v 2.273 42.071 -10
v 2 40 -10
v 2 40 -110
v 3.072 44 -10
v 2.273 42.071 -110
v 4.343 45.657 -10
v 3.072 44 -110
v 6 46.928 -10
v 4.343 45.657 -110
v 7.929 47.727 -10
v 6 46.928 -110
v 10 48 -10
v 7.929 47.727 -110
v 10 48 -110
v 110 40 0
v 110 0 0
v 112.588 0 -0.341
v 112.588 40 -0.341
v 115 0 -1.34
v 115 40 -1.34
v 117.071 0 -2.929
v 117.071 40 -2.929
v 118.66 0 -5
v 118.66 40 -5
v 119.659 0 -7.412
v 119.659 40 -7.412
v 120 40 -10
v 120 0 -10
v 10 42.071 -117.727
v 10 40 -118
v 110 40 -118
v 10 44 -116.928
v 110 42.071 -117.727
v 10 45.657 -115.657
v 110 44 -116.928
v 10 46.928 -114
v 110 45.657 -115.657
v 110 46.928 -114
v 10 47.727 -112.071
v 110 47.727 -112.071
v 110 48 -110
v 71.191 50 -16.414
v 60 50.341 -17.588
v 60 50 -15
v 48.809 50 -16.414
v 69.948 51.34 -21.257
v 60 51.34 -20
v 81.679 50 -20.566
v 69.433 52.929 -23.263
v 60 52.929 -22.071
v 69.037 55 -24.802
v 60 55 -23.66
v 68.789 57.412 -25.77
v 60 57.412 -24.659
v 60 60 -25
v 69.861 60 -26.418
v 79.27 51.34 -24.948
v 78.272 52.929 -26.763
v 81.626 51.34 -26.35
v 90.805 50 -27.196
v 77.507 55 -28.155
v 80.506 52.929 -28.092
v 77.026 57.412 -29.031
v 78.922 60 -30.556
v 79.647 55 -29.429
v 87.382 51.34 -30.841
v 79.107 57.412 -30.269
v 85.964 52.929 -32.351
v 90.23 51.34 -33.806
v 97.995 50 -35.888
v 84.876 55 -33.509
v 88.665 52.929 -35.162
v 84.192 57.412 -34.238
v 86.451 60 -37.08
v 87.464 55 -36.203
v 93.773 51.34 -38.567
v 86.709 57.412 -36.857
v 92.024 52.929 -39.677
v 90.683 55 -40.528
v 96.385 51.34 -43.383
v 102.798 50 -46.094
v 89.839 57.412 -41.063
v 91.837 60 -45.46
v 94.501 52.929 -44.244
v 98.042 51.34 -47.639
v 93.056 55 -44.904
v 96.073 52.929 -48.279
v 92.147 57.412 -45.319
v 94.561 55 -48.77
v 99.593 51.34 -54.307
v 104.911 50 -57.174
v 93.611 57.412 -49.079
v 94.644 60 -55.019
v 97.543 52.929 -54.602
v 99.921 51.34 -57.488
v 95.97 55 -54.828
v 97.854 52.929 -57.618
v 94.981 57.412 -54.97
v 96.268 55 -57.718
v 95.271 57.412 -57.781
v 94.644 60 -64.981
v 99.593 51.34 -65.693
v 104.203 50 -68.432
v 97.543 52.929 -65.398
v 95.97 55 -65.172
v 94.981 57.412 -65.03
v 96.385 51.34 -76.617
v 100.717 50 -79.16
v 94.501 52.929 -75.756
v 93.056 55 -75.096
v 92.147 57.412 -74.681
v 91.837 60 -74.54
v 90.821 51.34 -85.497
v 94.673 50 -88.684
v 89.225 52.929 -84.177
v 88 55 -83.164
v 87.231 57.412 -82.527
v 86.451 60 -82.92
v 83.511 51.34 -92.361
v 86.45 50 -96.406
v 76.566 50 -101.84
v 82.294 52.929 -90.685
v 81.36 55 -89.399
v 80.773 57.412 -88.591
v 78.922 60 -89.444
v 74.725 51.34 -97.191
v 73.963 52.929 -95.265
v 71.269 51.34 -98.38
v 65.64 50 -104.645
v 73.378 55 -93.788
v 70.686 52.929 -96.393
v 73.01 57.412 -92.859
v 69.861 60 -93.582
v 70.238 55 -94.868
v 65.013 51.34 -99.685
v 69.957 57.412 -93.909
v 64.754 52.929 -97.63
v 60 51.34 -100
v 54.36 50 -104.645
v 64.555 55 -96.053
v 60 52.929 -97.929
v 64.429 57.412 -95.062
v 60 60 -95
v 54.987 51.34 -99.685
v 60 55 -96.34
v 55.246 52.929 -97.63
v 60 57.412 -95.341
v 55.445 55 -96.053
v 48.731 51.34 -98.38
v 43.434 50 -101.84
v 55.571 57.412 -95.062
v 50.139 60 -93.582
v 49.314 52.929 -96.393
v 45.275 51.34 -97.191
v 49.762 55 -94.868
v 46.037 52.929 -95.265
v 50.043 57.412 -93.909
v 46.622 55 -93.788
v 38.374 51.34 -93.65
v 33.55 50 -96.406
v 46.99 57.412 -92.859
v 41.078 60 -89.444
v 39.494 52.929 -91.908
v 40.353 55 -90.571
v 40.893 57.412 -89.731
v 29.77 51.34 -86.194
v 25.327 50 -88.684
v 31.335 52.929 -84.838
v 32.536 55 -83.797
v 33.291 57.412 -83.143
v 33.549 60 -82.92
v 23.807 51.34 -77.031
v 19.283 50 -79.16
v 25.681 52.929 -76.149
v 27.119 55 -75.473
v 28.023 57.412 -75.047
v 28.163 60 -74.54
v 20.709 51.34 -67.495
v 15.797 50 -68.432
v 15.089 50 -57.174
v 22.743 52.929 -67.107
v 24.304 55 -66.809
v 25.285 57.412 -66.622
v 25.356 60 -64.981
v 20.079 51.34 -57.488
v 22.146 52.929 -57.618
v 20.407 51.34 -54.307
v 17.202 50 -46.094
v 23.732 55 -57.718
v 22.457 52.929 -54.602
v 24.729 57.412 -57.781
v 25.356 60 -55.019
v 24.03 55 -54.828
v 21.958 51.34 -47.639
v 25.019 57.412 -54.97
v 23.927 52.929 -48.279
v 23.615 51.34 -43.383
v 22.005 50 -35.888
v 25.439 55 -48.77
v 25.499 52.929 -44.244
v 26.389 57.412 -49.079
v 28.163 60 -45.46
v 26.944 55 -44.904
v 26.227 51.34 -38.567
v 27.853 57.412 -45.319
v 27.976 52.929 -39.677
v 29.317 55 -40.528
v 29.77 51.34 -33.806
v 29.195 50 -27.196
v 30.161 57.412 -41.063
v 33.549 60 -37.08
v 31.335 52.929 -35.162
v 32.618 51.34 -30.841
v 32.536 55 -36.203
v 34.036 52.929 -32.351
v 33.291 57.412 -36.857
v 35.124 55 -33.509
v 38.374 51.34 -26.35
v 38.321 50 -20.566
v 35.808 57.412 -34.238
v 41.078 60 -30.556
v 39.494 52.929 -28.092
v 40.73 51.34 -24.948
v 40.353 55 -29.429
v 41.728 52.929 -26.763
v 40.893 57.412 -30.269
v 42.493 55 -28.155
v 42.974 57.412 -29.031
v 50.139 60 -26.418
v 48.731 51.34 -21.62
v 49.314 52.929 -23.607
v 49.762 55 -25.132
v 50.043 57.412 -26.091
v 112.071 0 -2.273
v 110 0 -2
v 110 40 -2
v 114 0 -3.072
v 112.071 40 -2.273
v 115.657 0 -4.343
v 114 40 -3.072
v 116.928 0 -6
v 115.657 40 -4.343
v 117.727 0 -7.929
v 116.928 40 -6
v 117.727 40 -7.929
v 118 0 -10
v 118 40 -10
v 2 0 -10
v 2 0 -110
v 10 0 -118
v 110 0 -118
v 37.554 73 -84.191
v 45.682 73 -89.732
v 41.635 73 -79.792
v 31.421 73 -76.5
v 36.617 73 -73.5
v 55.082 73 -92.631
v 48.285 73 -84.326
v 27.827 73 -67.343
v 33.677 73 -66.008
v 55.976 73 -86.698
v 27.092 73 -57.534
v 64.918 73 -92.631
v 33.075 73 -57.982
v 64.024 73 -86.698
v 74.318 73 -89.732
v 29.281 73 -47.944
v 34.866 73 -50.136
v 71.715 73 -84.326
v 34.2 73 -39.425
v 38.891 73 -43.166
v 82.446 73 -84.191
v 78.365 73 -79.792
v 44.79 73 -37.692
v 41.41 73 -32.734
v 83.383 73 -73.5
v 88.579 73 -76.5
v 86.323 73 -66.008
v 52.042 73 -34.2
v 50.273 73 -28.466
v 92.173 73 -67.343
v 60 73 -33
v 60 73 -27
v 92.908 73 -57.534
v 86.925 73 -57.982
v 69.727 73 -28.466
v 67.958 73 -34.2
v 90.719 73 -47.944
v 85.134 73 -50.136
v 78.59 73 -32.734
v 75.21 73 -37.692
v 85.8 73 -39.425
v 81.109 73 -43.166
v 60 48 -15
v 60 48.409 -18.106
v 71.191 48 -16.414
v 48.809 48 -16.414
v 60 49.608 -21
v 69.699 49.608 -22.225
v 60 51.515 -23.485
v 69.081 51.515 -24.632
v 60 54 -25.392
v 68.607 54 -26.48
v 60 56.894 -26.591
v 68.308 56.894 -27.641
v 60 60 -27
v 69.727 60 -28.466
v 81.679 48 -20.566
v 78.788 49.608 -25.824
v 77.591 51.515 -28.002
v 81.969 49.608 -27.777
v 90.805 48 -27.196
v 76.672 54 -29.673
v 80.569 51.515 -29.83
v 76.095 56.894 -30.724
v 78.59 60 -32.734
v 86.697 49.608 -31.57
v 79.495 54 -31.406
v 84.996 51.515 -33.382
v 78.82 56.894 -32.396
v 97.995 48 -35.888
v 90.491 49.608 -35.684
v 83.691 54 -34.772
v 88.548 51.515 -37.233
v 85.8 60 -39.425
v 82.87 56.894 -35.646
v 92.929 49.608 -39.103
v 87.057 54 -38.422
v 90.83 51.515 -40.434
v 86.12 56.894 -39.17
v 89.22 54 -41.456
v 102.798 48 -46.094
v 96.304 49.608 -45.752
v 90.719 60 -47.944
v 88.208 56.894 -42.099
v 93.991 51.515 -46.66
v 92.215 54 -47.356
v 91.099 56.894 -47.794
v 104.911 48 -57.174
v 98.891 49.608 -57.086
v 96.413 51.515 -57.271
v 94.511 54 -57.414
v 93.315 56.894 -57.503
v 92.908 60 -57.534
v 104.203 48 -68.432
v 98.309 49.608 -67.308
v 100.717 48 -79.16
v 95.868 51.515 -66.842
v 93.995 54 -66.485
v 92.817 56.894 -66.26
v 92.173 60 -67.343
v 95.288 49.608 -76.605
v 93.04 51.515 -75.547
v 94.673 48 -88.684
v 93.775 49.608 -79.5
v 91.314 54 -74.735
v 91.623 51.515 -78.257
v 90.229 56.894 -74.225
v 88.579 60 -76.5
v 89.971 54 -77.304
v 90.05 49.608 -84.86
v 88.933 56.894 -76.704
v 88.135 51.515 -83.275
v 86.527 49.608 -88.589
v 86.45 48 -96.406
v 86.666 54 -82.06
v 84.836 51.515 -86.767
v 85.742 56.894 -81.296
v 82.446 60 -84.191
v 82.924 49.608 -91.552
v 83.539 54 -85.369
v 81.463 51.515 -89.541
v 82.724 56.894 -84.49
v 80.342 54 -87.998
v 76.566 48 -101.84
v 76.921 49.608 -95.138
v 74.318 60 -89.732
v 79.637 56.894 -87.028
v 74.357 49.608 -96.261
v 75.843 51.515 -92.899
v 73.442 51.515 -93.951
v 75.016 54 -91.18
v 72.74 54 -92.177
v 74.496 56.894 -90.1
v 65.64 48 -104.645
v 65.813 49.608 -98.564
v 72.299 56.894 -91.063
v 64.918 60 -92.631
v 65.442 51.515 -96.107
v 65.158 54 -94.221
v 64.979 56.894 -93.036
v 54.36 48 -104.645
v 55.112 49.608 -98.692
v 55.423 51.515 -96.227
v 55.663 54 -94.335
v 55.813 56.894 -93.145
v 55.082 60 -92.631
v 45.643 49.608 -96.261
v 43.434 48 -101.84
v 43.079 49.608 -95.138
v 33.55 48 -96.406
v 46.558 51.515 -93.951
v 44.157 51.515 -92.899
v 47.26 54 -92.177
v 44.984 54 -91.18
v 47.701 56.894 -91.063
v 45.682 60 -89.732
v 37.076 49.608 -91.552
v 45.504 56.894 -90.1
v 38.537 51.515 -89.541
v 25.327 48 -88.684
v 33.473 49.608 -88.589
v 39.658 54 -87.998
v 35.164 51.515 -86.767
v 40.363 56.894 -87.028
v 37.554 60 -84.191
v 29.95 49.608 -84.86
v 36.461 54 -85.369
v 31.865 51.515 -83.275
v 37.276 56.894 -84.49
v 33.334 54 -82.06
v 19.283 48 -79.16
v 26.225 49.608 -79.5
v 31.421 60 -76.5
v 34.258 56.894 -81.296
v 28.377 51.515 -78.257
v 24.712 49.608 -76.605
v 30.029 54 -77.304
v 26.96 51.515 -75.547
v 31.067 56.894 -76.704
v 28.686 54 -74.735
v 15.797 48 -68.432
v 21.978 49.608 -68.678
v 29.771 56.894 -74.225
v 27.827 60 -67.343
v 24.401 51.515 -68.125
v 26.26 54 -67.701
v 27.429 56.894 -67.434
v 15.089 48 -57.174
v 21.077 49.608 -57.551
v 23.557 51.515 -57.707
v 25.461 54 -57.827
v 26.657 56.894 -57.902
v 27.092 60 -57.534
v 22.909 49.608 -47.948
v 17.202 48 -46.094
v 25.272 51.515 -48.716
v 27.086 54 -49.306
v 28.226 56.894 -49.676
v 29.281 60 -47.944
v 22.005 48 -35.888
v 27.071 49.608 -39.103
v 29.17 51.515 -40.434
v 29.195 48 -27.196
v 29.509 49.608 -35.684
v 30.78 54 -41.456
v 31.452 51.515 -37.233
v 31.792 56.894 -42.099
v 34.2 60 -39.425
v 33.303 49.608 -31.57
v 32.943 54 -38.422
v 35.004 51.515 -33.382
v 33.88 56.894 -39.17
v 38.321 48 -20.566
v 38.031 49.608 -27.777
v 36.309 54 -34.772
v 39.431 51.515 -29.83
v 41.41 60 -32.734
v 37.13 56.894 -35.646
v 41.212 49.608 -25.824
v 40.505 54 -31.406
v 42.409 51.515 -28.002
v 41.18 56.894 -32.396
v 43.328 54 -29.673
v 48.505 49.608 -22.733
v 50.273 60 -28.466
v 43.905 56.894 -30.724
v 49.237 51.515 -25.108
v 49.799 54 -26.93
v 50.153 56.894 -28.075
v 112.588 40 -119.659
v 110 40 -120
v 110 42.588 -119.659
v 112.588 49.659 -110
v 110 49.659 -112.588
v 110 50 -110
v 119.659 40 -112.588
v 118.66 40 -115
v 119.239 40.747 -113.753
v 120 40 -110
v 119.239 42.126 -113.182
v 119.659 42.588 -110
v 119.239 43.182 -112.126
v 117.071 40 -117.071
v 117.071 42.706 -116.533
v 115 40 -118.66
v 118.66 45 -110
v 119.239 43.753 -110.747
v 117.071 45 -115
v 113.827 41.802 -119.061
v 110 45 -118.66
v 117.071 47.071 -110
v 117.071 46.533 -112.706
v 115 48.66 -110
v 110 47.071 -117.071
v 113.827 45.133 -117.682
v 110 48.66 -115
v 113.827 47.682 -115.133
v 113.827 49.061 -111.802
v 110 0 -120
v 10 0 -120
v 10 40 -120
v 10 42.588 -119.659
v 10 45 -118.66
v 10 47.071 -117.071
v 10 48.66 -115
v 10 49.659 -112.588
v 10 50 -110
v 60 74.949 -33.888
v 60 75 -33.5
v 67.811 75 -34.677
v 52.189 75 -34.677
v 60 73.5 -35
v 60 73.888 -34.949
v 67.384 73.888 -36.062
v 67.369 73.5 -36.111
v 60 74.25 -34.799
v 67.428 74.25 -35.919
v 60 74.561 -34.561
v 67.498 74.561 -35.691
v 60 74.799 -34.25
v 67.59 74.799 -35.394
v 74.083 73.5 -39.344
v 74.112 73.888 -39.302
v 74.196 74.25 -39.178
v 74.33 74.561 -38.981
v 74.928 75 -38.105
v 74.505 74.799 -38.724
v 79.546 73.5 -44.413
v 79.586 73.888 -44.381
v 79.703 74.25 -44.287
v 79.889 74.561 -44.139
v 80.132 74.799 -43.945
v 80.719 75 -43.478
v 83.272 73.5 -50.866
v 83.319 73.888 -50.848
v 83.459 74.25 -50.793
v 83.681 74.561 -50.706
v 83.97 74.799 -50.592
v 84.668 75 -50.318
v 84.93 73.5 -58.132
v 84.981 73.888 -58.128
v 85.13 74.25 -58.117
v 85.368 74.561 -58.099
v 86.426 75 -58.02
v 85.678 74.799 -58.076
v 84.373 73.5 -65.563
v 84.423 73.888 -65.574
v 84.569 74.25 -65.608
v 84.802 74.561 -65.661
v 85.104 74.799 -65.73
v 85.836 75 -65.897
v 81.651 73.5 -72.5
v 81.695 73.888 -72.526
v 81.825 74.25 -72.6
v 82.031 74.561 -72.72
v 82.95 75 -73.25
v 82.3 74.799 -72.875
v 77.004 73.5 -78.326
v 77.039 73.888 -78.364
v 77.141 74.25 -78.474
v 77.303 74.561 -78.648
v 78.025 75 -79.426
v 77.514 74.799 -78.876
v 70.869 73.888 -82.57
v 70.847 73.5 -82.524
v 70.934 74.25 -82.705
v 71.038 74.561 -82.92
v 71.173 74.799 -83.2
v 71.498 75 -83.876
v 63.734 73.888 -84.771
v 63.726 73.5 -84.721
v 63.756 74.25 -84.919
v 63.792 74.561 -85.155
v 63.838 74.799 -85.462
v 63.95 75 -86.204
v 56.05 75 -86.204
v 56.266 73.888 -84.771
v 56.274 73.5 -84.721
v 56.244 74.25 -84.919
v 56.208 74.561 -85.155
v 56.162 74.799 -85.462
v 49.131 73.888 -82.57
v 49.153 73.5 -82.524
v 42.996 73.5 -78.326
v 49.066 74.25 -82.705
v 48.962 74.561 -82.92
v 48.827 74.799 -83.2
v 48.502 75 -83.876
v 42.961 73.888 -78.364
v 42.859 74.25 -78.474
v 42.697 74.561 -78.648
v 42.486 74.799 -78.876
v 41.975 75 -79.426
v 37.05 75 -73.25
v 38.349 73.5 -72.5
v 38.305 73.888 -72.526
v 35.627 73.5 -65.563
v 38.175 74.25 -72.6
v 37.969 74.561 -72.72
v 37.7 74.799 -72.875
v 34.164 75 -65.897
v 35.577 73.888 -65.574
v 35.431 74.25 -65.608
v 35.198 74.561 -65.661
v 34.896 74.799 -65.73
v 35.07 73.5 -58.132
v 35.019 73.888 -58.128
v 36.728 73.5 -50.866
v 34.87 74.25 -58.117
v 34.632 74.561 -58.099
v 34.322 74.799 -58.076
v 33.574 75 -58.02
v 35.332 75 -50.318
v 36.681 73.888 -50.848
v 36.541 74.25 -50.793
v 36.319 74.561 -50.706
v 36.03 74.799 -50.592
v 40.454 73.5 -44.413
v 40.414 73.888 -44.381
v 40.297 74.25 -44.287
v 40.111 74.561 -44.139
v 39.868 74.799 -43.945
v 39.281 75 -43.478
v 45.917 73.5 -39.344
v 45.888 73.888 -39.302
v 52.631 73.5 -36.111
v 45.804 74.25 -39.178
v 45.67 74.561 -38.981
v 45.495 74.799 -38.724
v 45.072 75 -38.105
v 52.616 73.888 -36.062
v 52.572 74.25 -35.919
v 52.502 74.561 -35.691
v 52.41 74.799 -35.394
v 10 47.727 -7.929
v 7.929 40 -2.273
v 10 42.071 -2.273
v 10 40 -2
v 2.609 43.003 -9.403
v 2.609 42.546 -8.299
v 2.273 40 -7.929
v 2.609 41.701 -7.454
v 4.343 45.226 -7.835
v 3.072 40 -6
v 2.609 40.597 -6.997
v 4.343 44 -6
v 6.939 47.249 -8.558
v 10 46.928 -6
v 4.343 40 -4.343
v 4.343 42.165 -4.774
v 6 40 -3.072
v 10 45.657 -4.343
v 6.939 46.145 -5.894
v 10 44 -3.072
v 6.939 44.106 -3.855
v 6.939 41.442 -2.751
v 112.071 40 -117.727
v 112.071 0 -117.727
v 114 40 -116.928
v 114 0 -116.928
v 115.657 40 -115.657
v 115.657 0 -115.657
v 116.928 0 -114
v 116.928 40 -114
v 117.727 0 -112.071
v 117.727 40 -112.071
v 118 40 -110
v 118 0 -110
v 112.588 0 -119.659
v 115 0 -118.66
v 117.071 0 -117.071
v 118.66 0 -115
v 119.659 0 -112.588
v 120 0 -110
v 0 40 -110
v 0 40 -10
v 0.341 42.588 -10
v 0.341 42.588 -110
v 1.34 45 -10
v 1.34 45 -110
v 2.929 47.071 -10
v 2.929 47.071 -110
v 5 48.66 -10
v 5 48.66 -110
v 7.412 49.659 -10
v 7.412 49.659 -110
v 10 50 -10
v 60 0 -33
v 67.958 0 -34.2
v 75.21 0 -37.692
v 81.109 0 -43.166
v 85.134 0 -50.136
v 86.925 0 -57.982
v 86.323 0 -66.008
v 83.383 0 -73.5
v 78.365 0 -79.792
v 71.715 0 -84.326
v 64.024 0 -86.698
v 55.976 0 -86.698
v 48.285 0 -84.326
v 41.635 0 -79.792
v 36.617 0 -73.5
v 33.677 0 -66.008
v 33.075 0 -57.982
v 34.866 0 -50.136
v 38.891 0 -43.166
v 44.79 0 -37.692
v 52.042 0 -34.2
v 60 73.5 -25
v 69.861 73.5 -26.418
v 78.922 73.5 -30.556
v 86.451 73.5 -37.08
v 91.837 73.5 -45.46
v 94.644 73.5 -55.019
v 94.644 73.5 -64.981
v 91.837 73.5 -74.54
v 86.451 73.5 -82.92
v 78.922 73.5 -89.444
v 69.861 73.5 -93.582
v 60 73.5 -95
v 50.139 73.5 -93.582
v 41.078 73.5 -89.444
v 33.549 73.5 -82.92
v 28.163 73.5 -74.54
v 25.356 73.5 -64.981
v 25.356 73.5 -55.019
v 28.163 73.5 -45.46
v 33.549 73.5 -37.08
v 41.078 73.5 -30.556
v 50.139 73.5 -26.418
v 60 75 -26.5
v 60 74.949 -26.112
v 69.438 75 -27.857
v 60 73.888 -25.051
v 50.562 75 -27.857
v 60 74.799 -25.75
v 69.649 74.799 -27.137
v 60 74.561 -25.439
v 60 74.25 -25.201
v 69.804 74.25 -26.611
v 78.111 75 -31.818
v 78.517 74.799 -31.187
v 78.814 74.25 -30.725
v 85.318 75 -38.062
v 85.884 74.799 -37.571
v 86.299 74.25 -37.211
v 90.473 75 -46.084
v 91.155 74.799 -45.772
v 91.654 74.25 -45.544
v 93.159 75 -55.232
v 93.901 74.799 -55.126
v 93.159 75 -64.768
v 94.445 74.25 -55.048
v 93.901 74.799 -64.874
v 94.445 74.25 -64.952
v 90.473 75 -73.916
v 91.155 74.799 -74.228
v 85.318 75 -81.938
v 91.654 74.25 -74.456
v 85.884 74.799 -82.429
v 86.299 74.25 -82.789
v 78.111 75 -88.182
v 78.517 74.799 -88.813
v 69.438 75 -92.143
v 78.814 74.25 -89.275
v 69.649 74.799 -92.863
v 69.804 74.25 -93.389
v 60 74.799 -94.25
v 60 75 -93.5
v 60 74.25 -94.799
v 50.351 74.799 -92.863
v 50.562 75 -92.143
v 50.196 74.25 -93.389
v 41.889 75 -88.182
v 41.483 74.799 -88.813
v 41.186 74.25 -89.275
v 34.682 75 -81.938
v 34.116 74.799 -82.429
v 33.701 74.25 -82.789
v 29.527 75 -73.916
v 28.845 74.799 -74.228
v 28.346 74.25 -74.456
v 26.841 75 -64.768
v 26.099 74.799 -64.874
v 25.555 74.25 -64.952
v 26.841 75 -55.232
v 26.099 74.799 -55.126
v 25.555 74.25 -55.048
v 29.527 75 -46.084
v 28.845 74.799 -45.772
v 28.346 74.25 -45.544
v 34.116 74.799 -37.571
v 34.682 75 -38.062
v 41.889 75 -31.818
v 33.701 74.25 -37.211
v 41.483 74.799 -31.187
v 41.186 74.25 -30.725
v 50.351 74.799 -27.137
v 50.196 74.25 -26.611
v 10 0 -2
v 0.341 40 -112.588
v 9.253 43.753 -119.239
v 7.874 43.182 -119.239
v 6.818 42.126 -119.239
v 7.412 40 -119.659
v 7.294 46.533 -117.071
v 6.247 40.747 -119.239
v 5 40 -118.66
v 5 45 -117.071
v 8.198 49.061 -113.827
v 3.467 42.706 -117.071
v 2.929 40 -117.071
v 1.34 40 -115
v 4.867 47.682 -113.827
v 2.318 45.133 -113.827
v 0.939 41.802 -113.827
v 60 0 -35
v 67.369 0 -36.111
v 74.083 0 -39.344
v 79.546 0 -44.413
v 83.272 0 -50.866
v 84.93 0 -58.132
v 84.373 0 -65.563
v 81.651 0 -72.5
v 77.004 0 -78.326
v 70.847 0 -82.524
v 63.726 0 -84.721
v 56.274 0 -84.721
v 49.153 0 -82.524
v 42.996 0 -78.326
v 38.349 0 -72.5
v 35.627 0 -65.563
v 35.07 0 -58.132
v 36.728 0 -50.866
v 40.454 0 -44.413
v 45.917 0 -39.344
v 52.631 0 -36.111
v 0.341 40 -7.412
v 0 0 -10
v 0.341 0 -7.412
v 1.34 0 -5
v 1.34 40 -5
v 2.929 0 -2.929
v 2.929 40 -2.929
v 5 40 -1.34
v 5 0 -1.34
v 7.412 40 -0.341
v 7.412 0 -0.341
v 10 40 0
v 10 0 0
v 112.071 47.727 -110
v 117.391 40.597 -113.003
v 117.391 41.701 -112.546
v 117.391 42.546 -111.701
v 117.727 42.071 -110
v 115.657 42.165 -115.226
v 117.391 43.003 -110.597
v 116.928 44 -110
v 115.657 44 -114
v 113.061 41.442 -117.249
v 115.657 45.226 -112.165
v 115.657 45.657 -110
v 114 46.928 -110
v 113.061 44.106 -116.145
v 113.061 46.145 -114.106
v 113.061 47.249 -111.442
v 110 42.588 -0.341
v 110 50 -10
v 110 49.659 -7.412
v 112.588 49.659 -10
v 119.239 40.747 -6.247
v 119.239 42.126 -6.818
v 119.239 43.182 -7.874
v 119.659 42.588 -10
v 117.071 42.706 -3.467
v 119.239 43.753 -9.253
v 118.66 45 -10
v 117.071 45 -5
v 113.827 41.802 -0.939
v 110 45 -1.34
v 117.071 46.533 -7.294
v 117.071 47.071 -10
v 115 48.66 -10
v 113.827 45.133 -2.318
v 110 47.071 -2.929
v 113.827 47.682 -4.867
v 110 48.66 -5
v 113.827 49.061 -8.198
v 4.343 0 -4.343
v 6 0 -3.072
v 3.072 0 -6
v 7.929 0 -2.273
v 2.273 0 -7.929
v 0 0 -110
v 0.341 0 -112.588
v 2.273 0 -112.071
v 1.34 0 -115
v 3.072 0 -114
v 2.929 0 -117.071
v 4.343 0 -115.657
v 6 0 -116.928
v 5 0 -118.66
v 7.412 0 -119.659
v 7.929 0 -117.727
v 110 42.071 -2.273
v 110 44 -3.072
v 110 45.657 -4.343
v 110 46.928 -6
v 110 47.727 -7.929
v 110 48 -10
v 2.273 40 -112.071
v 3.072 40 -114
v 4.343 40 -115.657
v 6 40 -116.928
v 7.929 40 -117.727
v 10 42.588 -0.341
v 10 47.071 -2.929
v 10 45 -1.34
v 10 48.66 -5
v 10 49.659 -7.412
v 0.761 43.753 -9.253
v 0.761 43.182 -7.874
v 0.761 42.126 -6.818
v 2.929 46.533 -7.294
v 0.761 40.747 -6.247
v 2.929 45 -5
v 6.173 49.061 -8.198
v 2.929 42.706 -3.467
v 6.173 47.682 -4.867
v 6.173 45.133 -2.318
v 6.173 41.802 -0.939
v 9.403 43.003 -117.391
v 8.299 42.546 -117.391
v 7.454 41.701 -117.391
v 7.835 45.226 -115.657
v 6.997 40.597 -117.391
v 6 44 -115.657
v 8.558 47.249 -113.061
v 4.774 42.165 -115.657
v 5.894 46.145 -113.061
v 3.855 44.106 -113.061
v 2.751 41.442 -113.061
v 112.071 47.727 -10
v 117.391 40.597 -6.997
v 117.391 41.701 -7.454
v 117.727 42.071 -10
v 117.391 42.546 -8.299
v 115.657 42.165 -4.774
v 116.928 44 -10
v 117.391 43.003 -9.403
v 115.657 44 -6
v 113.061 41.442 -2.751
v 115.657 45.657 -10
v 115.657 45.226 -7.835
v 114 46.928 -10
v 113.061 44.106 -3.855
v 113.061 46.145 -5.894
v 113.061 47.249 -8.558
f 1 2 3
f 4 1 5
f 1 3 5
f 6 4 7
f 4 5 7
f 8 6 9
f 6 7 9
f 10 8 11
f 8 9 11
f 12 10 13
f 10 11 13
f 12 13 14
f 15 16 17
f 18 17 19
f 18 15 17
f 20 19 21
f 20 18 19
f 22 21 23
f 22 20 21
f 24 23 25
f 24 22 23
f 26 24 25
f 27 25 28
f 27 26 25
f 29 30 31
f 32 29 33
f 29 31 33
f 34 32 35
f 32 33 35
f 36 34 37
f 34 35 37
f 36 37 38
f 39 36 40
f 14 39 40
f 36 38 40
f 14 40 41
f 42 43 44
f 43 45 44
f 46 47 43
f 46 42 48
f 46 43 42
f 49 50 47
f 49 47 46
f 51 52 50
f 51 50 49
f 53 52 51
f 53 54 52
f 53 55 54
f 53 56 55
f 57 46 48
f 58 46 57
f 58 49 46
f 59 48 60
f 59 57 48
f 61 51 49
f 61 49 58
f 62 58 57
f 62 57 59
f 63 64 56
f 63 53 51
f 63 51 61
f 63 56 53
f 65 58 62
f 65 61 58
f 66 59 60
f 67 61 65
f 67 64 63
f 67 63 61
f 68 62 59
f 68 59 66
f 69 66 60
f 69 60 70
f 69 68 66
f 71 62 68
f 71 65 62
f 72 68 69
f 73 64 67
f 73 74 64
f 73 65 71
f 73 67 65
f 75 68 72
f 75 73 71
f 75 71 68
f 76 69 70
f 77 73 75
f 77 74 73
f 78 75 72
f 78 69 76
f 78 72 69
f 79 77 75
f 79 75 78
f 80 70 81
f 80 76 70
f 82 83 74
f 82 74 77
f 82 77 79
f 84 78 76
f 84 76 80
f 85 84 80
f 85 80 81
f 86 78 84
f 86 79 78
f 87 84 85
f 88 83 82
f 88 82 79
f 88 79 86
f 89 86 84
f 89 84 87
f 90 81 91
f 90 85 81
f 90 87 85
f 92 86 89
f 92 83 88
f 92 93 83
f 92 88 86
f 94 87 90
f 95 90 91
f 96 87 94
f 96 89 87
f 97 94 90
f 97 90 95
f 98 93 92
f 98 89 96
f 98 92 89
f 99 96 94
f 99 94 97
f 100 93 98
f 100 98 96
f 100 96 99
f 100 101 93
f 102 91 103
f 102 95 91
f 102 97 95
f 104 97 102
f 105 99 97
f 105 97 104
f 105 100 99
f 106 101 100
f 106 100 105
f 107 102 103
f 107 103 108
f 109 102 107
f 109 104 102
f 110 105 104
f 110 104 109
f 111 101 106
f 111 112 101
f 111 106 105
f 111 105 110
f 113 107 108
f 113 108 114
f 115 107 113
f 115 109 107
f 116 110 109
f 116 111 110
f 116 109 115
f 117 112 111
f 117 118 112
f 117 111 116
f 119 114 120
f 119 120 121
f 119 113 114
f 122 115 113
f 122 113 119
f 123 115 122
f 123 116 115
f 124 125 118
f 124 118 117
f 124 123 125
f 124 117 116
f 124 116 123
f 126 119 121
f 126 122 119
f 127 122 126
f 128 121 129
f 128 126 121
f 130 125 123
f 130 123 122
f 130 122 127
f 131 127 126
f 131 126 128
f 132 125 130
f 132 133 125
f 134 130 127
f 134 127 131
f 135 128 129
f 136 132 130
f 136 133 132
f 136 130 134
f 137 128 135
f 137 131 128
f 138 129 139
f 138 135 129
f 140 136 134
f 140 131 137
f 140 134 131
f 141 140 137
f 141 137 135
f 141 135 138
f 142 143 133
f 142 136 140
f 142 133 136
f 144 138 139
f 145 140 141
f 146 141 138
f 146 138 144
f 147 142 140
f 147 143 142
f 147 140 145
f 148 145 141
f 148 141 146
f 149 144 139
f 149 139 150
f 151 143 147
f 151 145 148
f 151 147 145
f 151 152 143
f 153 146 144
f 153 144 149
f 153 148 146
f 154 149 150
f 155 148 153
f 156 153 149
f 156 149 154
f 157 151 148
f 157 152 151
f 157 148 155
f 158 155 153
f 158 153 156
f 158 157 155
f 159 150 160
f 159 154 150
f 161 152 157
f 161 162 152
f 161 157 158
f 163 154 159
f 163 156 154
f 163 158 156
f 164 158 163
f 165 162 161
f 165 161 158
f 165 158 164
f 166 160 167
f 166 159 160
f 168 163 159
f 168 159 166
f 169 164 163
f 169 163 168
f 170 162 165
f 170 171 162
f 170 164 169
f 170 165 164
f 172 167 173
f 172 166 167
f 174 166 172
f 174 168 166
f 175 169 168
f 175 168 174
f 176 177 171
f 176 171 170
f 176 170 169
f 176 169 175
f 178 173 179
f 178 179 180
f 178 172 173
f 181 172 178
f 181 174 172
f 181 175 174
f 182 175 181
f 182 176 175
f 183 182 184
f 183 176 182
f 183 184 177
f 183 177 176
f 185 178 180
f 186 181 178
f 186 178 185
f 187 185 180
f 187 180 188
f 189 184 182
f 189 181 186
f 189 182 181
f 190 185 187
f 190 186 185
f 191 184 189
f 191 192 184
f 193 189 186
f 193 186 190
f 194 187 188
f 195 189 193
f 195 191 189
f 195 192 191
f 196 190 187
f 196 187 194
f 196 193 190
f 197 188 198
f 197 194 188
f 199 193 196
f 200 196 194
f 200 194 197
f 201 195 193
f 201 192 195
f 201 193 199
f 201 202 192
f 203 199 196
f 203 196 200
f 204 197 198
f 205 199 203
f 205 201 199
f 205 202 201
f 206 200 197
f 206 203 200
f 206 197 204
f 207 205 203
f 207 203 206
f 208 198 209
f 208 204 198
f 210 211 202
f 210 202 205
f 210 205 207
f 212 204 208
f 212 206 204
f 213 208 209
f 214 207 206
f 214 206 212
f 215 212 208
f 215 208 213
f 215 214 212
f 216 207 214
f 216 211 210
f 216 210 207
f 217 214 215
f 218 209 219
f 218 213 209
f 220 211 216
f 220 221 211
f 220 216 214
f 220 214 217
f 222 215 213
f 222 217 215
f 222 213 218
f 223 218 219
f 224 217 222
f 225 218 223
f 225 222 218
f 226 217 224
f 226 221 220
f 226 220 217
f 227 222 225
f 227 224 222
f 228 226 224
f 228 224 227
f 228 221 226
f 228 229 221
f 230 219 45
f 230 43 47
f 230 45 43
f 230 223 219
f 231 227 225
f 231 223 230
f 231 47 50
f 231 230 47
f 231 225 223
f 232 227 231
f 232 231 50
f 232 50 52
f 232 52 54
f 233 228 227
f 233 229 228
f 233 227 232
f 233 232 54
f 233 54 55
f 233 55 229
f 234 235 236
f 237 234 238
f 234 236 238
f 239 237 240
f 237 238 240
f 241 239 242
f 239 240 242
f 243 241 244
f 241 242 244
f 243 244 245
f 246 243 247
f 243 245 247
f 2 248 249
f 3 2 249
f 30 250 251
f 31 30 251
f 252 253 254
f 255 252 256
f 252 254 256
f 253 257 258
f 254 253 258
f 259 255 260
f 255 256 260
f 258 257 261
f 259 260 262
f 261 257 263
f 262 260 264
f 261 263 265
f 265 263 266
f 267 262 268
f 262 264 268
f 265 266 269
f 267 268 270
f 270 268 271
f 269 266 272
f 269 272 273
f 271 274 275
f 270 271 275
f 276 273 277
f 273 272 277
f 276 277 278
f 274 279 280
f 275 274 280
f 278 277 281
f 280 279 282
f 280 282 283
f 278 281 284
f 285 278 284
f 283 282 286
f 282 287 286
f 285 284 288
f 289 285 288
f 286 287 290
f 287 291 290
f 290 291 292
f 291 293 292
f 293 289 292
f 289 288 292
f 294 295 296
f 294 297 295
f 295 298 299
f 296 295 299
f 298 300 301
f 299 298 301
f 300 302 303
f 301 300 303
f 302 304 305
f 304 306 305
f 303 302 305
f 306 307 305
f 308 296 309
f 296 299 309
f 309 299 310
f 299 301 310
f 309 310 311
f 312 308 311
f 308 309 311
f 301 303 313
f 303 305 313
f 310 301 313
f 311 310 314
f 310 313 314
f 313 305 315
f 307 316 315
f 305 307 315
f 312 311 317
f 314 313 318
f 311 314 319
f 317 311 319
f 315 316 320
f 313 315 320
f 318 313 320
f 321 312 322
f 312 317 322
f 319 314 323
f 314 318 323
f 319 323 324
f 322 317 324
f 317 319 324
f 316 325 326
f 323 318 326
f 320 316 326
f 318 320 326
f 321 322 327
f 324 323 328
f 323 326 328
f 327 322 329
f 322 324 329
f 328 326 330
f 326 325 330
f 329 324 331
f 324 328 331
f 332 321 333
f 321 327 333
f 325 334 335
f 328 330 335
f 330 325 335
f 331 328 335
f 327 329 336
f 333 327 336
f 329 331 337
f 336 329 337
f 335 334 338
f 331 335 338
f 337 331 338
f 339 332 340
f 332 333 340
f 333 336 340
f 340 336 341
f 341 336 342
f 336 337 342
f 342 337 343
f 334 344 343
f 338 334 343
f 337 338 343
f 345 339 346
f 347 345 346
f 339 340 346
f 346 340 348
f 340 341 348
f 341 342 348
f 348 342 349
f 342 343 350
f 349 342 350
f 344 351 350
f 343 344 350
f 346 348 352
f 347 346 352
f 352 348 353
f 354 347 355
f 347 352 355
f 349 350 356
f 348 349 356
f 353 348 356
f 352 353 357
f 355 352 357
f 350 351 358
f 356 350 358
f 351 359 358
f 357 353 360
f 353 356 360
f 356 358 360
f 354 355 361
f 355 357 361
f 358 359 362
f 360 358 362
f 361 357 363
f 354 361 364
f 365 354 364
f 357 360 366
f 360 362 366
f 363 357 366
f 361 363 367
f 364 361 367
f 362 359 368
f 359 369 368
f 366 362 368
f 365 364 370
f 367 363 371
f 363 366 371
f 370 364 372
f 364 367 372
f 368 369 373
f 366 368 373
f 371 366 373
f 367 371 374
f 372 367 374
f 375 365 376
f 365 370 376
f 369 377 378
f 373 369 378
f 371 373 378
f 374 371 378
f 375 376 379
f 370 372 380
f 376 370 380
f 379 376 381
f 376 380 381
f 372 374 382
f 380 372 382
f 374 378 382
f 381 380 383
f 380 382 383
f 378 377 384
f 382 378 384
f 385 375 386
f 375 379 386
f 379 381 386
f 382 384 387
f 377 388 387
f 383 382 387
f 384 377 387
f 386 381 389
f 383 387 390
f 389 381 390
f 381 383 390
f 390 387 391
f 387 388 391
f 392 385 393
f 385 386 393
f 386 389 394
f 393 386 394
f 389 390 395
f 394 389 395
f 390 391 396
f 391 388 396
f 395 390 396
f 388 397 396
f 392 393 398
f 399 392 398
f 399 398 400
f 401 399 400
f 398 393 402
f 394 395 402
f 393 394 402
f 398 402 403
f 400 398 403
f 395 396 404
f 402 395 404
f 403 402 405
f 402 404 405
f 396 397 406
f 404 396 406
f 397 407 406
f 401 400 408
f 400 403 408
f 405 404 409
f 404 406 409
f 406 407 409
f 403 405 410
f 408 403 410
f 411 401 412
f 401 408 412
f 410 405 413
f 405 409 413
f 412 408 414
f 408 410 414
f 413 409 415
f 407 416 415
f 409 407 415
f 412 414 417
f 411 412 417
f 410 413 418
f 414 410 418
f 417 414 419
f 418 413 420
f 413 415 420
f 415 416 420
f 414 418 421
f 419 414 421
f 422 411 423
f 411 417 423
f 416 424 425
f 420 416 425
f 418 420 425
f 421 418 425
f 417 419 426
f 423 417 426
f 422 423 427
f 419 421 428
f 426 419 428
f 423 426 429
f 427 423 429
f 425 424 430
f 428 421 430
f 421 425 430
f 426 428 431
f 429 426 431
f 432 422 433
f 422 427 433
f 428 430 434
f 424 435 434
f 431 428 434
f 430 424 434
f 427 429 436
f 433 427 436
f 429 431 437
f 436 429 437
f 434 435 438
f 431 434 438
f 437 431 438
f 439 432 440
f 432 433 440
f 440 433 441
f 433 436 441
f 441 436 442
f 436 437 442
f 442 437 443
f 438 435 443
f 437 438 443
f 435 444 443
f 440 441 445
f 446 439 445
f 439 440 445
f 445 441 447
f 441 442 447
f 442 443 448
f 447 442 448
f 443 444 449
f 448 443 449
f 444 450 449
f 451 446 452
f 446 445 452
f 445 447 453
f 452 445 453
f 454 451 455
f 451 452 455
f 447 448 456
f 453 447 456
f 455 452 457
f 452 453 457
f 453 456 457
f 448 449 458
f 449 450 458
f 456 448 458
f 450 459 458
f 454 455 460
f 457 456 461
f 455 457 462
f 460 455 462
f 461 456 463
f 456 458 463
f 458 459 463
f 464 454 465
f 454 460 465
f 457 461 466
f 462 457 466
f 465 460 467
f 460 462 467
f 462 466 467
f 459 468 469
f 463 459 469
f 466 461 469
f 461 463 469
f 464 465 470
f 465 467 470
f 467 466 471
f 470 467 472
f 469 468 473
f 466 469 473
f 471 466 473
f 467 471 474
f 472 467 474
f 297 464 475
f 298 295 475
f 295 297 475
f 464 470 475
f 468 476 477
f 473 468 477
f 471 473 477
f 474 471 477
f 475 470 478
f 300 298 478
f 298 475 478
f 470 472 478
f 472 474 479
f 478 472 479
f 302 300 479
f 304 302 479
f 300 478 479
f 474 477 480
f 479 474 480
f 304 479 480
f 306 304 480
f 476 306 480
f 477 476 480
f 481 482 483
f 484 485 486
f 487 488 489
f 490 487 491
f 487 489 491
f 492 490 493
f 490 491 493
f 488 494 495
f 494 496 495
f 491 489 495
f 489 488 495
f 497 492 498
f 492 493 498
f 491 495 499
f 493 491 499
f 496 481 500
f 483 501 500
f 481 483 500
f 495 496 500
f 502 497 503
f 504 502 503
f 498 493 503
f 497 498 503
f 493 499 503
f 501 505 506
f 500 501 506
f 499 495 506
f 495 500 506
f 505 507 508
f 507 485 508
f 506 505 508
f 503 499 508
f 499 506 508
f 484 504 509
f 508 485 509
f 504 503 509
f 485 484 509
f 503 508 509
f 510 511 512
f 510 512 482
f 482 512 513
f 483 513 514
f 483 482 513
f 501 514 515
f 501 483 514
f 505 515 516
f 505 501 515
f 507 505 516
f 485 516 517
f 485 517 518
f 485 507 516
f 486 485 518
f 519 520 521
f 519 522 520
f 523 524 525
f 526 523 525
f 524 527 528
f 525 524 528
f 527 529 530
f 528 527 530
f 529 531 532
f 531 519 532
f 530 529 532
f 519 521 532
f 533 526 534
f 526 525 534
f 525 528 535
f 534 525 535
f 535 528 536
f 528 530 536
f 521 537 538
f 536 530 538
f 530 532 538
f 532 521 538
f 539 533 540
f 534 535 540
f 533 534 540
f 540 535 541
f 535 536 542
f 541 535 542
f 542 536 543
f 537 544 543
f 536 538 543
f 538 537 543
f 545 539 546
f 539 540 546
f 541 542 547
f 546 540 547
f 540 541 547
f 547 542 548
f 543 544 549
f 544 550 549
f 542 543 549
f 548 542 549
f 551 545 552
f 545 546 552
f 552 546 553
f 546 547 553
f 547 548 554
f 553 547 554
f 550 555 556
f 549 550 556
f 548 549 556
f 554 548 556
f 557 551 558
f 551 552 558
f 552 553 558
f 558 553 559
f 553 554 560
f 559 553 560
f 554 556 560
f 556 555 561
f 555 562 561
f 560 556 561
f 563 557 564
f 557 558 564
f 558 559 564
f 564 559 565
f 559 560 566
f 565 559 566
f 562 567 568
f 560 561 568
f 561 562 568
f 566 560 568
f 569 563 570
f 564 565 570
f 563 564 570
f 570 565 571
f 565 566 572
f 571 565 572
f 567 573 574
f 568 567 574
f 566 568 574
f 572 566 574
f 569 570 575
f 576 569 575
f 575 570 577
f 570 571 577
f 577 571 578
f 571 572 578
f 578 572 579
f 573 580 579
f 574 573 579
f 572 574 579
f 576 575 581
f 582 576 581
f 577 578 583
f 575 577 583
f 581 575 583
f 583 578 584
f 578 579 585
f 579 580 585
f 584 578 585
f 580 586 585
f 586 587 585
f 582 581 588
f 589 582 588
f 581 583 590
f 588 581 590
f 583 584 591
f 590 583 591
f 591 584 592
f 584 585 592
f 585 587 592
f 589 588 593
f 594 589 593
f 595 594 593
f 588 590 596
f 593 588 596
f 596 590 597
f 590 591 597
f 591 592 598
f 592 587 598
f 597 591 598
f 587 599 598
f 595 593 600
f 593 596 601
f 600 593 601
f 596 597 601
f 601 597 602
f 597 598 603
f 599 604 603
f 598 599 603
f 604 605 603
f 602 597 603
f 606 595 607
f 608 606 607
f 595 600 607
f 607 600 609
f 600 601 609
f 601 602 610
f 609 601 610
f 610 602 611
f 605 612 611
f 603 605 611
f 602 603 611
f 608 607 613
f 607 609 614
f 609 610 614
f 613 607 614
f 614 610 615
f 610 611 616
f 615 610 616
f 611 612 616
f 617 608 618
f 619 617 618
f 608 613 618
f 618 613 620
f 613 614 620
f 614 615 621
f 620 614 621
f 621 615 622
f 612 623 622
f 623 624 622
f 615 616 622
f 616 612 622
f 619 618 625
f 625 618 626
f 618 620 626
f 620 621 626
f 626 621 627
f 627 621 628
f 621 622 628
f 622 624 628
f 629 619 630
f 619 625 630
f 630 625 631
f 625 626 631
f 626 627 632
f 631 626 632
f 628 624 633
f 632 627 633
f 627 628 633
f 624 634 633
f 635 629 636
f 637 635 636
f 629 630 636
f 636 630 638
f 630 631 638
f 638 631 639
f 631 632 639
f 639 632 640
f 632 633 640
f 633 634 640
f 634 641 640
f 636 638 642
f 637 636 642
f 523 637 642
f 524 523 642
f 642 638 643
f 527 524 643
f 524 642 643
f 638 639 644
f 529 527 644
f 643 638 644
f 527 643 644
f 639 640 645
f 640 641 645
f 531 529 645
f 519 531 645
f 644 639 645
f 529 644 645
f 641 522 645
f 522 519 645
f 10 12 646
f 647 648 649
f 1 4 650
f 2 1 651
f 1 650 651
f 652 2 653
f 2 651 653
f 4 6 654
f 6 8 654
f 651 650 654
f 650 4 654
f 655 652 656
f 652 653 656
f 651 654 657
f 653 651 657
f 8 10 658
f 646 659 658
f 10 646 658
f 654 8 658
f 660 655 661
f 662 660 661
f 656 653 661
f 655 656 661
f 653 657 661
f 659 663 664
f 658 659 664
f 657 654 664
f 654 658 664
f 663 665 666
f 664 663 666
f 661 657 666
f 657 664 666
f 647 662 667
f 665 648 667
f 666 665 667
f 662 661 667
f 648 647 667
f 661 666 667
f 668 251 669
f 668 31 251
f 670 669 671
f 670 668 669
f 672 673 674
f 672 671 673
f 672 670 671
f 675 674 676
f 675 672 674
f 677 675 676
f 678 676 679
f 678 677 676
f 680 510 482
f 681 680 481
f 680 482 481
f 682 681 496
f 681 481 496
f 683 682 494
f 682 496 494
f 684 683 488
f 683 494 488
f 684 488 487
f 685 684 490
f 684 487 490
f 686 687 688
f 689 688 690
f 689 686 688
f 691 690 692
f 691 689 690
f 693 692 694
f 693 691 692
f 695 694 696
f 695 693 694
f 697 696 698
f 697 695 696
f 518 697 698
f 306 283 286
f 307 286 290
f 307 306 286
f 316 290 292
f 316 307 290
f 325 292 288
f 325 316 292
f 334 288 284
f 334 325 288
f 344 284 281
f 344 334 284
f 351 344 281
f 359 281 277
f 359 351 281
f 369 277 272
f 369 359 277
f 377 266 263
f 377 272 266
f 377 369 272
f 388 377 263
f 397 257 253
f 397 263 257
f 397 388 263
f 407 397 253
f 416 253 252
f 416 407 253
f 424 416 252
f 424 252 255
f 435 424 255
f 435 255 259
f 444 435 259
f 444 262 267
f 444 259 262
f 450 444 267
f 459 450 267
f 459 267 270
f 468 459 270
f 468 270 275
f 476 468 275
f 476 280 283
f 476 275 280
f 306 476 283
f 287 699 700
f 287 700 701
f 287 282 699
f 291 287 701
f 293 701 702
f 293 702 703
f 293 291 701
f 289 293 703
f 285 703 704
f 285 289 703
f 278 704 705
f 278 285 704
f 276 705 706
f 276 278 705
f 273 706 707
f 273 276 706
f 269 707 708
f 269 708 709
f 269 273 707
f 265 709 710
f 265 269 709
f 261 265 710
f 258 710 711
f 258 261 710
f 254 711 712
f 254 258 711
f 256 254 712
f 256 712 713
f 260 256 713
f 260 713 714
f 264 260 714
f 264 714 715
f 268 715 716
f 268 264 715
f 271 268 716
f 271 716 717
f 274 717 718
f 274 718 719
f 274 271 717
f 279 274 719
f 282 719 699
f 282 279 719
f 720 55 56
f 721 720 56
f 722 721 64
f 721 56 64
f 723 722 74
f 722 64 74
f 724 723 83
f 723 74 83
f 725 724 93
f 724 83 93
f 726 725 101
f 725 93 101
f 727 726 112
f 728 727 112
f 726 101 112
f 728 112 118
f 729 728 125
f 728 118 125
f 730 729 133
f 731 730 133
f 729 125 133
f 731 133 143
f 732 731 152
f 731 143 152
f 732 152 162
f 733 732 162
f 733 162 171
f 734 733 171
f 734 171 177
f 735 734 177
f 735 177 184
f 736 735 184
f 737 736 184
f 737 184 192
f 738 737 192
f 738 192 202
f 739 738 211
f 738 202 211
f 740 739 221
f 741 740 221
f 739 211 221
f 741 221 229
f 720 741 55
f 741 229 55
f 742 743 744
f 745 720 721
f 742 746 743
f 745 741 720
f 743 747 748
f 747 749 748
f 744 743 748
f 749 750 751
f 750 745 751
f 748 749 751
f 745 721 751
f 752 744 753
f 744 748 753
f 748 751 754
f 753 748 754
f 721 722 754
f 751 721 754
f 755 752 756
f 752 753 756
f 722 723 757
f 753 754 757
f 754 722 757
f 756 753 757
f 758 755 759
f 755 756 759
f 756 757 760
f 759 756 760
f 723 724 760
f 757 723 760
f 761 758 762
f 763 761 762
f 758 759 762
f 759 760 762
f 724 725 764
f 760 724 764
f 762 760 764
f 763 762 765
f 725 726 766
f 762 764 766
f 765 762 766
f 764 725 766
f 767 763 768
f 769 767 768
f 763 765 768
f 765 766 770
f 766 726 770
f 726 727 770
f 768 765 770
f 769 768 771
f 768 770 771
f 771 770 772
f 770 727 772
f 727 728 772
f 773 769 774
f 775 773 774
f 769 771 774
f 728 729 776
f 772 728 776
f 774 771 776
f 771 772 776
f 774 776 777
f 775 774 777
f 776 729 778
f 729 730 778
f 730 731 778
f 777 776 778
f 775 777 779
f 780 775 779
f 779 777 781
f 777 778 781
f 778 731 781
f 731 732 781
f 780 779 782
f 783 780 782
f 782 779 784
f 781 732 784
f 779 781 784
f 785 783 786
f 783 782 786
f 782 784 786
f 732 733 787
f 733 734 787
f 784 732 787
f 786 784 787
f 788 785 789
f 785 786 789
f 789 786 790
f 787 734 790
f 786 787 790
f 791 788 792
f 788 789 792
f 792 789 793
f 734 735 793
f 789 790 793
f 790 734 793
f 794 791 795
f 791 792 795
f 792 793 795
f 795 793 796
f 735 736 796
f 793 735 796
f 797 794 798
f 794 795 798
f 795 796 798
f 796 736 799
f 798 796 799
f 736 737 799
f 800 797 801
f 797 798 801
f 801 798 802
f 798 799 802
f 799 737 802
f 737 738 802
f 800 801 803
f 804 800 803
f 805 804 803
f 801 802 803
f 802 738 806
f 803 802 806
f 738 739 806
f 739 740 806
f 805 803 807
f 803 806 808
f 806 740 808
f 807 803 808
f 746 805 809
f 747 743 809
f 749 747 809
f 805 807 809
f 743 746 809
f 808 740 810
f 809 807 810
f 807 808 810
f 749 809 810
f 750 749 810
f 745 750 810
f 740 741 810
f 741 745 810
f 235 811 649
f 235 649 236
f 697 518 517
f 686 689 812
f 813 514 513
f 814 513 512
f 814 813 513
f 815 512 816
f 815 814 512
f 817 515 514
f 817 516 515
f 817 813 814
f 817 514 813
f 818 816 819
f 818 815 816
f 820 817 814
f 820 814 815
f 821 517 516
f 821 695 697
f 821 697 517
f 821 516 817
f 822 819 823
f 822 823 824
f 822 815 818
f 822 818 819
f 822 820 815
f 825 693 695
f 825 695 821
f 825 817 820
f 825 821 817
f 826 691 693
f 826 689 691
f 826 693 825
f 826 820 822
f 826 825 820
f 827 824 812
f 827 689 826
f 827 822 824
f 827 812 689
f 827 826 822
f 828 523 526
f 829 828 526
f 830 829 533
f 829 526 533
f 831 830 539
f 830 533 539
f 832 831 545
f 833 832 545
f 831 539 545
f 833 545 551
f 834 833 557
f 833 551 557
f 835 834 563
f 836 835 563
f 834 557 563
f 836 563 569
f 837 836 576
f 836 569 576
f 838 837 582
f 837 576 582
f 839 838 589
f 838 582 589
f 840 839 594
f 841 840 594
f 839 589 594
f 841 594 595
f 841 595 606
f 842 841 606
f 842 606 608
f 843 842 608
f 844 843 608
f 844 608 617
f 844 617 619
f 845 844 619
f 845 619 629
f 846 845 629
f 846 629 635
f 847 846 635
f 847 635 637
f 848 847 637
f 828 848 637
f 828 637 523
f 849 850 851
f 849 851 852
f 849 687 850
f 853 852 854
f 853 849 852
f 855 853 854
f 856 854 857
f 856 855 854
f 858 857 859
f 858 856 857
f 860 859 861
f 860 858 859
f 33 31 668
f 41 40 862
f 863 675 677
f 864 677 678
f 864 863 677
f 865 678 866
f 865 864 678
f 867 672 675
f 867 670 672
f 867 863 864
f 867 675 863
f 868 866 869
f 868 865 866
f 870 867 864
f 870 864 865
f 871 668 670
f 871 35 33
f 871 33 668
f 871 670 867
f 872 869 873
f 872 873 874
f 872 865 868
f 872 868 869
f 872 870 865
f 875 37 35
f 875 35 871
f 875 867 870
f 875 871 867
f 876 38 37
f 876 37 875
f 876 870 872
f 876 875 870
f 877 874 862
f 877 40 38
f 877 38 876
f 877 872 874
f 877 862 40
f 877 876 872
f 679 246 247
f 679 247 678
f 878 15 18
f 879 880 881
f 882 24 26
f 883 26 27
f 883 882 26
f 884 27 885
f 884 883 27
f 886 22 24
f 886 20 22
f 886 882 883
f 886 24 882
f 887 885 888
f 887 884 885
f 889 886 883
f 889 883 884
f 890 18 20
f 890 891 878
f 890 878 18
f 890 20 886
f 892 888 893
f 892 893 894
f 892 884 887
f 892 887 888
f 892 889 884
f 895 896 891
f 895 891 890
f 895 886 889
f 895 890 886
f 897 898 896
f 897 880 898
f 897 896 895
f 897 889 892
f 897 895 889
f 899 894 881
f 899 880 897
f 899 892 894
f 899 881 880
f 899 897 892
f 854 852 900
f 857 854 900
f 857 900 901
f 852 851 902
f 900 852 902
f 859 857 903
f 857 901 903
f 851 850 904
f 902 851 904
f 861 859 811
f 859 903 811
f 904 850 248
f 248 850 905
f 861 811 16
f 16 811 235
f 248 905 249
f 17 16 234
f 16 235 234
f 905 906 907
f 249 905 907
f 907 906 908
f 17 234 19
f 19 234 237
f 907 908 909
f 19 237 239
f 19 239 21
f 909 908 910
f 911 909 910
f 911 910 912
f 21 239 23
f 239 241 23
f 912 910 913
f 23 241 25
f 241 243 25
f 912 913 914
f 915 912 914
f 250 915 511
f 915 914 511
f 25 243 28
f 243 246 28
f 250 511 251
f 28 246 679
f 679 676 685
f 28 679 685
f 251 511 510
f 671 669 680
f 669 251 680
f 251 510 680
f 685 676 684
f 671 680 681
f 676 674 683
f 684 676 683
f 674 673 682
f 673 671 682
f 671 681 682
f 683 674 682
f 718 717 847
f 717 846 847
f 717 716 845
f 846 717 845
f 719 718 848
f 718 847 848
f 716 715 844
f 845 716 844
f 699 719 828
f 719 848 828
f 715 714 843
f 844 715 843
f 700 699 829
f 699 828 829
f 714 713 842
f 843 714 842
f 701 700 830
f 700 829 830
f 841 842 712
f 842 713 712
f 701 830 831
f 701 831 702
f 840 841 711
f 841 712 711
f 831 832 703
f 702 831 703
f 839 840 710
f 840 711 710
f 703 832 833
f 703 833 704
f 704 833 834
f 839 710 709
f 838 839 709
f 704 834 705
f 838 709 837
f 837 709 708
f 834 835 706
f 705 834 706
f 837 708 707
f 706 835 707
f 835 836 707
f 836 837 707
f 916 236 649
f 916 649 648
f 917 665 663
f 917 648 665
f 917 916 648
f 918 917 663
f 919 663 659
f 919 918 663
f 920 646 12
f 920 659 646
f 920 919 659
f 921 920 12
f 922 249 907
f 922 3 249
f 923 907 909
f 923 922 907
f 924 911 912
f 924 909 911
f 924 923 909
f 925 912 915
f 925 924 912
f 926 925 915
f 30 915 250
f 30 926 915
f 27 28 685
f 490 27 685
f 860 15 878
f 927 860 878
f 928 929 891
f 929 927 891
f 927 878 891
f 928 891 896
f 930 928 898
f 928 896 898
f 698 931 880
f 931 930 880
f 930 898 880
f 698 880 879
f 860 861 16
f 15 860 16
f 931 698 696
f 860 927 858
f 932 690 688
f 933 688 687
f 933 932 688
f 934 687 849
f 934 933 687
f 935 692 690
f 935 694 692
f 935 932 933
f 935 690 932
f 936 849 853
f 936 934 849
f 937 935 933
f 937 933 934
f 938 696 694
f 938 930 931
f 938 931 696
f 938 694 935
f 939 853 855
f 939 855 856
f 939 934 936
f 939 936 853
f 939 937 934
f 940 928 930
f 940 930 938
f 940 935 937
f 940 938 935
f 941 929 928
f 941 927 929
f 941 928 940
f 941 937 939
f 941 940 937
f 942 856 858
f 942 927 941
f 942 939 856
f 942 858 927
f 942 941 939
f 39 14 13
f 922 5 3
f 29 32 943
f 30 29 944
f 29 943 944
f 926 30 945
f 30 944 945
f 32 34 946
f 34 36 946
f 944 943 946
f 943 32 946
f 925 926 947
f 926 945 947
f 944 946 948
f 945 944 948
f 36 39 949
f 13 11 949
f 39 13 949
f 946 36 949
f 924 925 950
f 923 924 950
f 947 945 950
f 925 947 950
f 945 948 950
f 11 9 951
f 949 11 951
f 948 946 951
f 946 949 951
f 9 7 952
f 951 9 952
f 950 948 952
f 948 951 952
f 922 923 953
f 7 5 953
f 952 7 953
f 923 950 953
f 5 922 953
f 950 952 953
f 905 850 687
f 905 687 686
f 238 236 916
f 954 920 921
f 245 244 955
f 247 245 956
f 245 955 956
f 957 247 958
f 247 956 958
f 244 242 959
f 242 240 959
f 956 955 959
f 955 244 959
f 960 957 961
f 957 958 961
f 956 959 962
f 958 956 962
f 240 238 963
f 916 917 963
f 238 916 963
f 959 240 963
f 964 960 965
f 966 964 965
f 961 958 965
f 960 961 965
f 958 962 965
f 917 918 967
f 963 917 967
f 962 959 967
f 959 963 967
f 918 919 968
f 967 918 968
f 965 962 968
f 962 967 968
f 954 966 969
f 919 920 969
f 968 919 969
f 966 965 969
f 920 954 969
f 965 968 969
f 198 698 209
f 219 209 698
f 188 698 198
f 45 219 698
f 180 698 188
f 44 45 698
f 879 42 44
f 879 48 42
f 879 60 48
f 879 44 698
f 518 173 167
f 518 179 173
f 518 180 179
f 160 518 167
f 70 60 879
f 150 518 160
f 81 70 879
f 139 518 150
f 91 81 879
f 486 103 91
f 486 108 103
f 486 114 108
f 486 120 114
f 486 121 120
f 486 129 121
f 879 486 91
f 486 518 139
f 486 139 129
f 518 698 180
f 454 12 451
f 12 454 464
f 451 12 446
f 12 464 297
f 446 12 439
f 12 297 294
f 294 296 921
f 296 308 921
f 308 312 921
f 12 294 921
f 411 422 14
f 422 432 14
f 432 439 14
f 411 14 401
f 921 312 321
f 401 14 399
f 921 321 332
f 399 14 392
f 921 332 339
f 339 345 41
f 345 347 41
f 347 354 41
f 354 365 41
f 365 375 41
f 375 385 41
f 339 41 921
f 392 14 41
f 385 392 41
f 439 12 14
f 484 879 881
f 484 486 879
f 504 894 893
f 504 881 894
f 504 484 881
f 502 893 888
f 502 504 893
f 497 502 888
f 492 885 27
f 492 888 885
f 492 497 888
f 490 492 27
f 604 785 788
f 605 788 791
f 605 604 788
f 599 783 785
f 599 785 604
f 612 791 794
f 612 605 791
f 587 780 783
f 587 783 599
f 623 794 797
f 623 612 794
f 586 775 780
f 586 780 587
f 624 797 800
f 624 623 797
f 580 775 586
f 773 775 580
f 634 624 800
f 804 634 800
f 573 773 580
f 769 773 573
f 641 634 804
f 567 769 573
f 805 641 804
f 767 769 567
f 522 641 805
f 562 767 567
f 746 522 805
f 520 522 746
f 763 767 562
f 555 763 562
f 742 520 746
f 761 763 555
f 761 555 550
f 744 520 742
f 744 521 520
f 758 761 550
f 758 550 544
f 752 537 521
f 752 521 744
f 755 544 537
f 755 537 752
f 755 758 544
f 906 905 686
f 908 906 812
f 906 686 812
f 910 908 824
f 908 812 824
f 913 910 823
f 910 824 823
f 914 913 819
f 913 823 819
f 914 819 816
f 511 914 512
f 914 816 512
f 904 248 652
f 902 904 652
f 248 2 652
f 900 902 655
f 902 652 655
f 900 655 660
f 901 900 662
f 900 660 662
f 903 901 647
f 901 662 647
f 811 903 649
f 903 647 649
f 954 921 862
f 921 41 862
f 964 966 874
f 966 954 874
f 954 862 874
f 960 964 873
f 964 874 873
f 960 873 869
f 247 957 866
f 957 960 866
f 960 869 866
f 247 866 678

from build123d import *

# Parameters (mm, degrees)
SKETCH3_W           = 120
SKETCH3_H           = 120
BOSS_EXTRUDE2_DEPTH = 50
SKETCH4_R           = 35
BOSS_EXTRUDE3_DEPTH = 25
SKETCH9_R           = 25
CUT_EXTRUDE3_DEPTH  = 186.539753153
FILLET4_R           = 10
FILLET5_R           = 1.5
SHELL2_T            = -2


with BuildPart() as part:
    # Sketch3 → Boss-Extrude2 (new body)
    with BuildSketch(Plane(origin=(0, 0, 0), x_dir=(1, 0, 0), z_dir=(0, 1, 0))):
        with Locations((60, 60)):
            Rectangle(SKETCH3_W, SKETCH3_H)
    extrude(amount=BOSS_EXTRUDE2_DEPTH)

    # Sketch4 → Boss-Extrude3 (add)
    with BuildSketch(Plane(origin=(0, 50, 0), x_dir=(1, 0, 0), z_dir=(0, 1, 0))):
        with Locations(Location((60, 60, 0), (0, 0, 270))):
            Circle(SKETCH4_R)
    extrude(amount=BOSS_EXTRUDE3_DEPTH)

    # Sketch9 → Cut-Extrude3 (cut, through all)
    with BuildSketch(Plane(origin=(0, 75, 0), x_dir=(1, 0, 0), z_dir=(0, 1, 0))):
        with Locations(Location((60, 60, 0), (0, 0, 270))):
            Circle(SKETCH9_R)
    extrude(amount=-CUT_EXTRUDE3_DEPTH, mode=Mode.SUBTRACT)

    # Fillet4
    fillet4_edges = [part.edges().sort_by_distance(p)[0] for p in [
        (60, 50, 0),
        (60, 50, -95),
        (0, 50, -60),
        (60, 50, -120),
        (0, 25, -120),
        (0, 25, 0),
        (120, 25, 0),
        (120, 25, -120),
        (120, 50, -60),
    ]]
    fillet(fillet4_edges, radius=FILLET4_R)

    # Fillet5
    fillet5_edges = [part.edges().sort_by_distance(p)[0] for p in [
        (60, 75, -95),
        (60, 75, -85),
    ]]
    fillet(fillet5_edges, radius=FILLET5_R)

    # Shell2
    shell2_openings = [part.faces().sort_by_distance(p)[0] for p in [
        (60, 0, -1.697056275),
    ]]
    offset(amount=SHELL2_T, openings=shell2_openings, kind=Kind.INTERSECTION)


solid = part.part
